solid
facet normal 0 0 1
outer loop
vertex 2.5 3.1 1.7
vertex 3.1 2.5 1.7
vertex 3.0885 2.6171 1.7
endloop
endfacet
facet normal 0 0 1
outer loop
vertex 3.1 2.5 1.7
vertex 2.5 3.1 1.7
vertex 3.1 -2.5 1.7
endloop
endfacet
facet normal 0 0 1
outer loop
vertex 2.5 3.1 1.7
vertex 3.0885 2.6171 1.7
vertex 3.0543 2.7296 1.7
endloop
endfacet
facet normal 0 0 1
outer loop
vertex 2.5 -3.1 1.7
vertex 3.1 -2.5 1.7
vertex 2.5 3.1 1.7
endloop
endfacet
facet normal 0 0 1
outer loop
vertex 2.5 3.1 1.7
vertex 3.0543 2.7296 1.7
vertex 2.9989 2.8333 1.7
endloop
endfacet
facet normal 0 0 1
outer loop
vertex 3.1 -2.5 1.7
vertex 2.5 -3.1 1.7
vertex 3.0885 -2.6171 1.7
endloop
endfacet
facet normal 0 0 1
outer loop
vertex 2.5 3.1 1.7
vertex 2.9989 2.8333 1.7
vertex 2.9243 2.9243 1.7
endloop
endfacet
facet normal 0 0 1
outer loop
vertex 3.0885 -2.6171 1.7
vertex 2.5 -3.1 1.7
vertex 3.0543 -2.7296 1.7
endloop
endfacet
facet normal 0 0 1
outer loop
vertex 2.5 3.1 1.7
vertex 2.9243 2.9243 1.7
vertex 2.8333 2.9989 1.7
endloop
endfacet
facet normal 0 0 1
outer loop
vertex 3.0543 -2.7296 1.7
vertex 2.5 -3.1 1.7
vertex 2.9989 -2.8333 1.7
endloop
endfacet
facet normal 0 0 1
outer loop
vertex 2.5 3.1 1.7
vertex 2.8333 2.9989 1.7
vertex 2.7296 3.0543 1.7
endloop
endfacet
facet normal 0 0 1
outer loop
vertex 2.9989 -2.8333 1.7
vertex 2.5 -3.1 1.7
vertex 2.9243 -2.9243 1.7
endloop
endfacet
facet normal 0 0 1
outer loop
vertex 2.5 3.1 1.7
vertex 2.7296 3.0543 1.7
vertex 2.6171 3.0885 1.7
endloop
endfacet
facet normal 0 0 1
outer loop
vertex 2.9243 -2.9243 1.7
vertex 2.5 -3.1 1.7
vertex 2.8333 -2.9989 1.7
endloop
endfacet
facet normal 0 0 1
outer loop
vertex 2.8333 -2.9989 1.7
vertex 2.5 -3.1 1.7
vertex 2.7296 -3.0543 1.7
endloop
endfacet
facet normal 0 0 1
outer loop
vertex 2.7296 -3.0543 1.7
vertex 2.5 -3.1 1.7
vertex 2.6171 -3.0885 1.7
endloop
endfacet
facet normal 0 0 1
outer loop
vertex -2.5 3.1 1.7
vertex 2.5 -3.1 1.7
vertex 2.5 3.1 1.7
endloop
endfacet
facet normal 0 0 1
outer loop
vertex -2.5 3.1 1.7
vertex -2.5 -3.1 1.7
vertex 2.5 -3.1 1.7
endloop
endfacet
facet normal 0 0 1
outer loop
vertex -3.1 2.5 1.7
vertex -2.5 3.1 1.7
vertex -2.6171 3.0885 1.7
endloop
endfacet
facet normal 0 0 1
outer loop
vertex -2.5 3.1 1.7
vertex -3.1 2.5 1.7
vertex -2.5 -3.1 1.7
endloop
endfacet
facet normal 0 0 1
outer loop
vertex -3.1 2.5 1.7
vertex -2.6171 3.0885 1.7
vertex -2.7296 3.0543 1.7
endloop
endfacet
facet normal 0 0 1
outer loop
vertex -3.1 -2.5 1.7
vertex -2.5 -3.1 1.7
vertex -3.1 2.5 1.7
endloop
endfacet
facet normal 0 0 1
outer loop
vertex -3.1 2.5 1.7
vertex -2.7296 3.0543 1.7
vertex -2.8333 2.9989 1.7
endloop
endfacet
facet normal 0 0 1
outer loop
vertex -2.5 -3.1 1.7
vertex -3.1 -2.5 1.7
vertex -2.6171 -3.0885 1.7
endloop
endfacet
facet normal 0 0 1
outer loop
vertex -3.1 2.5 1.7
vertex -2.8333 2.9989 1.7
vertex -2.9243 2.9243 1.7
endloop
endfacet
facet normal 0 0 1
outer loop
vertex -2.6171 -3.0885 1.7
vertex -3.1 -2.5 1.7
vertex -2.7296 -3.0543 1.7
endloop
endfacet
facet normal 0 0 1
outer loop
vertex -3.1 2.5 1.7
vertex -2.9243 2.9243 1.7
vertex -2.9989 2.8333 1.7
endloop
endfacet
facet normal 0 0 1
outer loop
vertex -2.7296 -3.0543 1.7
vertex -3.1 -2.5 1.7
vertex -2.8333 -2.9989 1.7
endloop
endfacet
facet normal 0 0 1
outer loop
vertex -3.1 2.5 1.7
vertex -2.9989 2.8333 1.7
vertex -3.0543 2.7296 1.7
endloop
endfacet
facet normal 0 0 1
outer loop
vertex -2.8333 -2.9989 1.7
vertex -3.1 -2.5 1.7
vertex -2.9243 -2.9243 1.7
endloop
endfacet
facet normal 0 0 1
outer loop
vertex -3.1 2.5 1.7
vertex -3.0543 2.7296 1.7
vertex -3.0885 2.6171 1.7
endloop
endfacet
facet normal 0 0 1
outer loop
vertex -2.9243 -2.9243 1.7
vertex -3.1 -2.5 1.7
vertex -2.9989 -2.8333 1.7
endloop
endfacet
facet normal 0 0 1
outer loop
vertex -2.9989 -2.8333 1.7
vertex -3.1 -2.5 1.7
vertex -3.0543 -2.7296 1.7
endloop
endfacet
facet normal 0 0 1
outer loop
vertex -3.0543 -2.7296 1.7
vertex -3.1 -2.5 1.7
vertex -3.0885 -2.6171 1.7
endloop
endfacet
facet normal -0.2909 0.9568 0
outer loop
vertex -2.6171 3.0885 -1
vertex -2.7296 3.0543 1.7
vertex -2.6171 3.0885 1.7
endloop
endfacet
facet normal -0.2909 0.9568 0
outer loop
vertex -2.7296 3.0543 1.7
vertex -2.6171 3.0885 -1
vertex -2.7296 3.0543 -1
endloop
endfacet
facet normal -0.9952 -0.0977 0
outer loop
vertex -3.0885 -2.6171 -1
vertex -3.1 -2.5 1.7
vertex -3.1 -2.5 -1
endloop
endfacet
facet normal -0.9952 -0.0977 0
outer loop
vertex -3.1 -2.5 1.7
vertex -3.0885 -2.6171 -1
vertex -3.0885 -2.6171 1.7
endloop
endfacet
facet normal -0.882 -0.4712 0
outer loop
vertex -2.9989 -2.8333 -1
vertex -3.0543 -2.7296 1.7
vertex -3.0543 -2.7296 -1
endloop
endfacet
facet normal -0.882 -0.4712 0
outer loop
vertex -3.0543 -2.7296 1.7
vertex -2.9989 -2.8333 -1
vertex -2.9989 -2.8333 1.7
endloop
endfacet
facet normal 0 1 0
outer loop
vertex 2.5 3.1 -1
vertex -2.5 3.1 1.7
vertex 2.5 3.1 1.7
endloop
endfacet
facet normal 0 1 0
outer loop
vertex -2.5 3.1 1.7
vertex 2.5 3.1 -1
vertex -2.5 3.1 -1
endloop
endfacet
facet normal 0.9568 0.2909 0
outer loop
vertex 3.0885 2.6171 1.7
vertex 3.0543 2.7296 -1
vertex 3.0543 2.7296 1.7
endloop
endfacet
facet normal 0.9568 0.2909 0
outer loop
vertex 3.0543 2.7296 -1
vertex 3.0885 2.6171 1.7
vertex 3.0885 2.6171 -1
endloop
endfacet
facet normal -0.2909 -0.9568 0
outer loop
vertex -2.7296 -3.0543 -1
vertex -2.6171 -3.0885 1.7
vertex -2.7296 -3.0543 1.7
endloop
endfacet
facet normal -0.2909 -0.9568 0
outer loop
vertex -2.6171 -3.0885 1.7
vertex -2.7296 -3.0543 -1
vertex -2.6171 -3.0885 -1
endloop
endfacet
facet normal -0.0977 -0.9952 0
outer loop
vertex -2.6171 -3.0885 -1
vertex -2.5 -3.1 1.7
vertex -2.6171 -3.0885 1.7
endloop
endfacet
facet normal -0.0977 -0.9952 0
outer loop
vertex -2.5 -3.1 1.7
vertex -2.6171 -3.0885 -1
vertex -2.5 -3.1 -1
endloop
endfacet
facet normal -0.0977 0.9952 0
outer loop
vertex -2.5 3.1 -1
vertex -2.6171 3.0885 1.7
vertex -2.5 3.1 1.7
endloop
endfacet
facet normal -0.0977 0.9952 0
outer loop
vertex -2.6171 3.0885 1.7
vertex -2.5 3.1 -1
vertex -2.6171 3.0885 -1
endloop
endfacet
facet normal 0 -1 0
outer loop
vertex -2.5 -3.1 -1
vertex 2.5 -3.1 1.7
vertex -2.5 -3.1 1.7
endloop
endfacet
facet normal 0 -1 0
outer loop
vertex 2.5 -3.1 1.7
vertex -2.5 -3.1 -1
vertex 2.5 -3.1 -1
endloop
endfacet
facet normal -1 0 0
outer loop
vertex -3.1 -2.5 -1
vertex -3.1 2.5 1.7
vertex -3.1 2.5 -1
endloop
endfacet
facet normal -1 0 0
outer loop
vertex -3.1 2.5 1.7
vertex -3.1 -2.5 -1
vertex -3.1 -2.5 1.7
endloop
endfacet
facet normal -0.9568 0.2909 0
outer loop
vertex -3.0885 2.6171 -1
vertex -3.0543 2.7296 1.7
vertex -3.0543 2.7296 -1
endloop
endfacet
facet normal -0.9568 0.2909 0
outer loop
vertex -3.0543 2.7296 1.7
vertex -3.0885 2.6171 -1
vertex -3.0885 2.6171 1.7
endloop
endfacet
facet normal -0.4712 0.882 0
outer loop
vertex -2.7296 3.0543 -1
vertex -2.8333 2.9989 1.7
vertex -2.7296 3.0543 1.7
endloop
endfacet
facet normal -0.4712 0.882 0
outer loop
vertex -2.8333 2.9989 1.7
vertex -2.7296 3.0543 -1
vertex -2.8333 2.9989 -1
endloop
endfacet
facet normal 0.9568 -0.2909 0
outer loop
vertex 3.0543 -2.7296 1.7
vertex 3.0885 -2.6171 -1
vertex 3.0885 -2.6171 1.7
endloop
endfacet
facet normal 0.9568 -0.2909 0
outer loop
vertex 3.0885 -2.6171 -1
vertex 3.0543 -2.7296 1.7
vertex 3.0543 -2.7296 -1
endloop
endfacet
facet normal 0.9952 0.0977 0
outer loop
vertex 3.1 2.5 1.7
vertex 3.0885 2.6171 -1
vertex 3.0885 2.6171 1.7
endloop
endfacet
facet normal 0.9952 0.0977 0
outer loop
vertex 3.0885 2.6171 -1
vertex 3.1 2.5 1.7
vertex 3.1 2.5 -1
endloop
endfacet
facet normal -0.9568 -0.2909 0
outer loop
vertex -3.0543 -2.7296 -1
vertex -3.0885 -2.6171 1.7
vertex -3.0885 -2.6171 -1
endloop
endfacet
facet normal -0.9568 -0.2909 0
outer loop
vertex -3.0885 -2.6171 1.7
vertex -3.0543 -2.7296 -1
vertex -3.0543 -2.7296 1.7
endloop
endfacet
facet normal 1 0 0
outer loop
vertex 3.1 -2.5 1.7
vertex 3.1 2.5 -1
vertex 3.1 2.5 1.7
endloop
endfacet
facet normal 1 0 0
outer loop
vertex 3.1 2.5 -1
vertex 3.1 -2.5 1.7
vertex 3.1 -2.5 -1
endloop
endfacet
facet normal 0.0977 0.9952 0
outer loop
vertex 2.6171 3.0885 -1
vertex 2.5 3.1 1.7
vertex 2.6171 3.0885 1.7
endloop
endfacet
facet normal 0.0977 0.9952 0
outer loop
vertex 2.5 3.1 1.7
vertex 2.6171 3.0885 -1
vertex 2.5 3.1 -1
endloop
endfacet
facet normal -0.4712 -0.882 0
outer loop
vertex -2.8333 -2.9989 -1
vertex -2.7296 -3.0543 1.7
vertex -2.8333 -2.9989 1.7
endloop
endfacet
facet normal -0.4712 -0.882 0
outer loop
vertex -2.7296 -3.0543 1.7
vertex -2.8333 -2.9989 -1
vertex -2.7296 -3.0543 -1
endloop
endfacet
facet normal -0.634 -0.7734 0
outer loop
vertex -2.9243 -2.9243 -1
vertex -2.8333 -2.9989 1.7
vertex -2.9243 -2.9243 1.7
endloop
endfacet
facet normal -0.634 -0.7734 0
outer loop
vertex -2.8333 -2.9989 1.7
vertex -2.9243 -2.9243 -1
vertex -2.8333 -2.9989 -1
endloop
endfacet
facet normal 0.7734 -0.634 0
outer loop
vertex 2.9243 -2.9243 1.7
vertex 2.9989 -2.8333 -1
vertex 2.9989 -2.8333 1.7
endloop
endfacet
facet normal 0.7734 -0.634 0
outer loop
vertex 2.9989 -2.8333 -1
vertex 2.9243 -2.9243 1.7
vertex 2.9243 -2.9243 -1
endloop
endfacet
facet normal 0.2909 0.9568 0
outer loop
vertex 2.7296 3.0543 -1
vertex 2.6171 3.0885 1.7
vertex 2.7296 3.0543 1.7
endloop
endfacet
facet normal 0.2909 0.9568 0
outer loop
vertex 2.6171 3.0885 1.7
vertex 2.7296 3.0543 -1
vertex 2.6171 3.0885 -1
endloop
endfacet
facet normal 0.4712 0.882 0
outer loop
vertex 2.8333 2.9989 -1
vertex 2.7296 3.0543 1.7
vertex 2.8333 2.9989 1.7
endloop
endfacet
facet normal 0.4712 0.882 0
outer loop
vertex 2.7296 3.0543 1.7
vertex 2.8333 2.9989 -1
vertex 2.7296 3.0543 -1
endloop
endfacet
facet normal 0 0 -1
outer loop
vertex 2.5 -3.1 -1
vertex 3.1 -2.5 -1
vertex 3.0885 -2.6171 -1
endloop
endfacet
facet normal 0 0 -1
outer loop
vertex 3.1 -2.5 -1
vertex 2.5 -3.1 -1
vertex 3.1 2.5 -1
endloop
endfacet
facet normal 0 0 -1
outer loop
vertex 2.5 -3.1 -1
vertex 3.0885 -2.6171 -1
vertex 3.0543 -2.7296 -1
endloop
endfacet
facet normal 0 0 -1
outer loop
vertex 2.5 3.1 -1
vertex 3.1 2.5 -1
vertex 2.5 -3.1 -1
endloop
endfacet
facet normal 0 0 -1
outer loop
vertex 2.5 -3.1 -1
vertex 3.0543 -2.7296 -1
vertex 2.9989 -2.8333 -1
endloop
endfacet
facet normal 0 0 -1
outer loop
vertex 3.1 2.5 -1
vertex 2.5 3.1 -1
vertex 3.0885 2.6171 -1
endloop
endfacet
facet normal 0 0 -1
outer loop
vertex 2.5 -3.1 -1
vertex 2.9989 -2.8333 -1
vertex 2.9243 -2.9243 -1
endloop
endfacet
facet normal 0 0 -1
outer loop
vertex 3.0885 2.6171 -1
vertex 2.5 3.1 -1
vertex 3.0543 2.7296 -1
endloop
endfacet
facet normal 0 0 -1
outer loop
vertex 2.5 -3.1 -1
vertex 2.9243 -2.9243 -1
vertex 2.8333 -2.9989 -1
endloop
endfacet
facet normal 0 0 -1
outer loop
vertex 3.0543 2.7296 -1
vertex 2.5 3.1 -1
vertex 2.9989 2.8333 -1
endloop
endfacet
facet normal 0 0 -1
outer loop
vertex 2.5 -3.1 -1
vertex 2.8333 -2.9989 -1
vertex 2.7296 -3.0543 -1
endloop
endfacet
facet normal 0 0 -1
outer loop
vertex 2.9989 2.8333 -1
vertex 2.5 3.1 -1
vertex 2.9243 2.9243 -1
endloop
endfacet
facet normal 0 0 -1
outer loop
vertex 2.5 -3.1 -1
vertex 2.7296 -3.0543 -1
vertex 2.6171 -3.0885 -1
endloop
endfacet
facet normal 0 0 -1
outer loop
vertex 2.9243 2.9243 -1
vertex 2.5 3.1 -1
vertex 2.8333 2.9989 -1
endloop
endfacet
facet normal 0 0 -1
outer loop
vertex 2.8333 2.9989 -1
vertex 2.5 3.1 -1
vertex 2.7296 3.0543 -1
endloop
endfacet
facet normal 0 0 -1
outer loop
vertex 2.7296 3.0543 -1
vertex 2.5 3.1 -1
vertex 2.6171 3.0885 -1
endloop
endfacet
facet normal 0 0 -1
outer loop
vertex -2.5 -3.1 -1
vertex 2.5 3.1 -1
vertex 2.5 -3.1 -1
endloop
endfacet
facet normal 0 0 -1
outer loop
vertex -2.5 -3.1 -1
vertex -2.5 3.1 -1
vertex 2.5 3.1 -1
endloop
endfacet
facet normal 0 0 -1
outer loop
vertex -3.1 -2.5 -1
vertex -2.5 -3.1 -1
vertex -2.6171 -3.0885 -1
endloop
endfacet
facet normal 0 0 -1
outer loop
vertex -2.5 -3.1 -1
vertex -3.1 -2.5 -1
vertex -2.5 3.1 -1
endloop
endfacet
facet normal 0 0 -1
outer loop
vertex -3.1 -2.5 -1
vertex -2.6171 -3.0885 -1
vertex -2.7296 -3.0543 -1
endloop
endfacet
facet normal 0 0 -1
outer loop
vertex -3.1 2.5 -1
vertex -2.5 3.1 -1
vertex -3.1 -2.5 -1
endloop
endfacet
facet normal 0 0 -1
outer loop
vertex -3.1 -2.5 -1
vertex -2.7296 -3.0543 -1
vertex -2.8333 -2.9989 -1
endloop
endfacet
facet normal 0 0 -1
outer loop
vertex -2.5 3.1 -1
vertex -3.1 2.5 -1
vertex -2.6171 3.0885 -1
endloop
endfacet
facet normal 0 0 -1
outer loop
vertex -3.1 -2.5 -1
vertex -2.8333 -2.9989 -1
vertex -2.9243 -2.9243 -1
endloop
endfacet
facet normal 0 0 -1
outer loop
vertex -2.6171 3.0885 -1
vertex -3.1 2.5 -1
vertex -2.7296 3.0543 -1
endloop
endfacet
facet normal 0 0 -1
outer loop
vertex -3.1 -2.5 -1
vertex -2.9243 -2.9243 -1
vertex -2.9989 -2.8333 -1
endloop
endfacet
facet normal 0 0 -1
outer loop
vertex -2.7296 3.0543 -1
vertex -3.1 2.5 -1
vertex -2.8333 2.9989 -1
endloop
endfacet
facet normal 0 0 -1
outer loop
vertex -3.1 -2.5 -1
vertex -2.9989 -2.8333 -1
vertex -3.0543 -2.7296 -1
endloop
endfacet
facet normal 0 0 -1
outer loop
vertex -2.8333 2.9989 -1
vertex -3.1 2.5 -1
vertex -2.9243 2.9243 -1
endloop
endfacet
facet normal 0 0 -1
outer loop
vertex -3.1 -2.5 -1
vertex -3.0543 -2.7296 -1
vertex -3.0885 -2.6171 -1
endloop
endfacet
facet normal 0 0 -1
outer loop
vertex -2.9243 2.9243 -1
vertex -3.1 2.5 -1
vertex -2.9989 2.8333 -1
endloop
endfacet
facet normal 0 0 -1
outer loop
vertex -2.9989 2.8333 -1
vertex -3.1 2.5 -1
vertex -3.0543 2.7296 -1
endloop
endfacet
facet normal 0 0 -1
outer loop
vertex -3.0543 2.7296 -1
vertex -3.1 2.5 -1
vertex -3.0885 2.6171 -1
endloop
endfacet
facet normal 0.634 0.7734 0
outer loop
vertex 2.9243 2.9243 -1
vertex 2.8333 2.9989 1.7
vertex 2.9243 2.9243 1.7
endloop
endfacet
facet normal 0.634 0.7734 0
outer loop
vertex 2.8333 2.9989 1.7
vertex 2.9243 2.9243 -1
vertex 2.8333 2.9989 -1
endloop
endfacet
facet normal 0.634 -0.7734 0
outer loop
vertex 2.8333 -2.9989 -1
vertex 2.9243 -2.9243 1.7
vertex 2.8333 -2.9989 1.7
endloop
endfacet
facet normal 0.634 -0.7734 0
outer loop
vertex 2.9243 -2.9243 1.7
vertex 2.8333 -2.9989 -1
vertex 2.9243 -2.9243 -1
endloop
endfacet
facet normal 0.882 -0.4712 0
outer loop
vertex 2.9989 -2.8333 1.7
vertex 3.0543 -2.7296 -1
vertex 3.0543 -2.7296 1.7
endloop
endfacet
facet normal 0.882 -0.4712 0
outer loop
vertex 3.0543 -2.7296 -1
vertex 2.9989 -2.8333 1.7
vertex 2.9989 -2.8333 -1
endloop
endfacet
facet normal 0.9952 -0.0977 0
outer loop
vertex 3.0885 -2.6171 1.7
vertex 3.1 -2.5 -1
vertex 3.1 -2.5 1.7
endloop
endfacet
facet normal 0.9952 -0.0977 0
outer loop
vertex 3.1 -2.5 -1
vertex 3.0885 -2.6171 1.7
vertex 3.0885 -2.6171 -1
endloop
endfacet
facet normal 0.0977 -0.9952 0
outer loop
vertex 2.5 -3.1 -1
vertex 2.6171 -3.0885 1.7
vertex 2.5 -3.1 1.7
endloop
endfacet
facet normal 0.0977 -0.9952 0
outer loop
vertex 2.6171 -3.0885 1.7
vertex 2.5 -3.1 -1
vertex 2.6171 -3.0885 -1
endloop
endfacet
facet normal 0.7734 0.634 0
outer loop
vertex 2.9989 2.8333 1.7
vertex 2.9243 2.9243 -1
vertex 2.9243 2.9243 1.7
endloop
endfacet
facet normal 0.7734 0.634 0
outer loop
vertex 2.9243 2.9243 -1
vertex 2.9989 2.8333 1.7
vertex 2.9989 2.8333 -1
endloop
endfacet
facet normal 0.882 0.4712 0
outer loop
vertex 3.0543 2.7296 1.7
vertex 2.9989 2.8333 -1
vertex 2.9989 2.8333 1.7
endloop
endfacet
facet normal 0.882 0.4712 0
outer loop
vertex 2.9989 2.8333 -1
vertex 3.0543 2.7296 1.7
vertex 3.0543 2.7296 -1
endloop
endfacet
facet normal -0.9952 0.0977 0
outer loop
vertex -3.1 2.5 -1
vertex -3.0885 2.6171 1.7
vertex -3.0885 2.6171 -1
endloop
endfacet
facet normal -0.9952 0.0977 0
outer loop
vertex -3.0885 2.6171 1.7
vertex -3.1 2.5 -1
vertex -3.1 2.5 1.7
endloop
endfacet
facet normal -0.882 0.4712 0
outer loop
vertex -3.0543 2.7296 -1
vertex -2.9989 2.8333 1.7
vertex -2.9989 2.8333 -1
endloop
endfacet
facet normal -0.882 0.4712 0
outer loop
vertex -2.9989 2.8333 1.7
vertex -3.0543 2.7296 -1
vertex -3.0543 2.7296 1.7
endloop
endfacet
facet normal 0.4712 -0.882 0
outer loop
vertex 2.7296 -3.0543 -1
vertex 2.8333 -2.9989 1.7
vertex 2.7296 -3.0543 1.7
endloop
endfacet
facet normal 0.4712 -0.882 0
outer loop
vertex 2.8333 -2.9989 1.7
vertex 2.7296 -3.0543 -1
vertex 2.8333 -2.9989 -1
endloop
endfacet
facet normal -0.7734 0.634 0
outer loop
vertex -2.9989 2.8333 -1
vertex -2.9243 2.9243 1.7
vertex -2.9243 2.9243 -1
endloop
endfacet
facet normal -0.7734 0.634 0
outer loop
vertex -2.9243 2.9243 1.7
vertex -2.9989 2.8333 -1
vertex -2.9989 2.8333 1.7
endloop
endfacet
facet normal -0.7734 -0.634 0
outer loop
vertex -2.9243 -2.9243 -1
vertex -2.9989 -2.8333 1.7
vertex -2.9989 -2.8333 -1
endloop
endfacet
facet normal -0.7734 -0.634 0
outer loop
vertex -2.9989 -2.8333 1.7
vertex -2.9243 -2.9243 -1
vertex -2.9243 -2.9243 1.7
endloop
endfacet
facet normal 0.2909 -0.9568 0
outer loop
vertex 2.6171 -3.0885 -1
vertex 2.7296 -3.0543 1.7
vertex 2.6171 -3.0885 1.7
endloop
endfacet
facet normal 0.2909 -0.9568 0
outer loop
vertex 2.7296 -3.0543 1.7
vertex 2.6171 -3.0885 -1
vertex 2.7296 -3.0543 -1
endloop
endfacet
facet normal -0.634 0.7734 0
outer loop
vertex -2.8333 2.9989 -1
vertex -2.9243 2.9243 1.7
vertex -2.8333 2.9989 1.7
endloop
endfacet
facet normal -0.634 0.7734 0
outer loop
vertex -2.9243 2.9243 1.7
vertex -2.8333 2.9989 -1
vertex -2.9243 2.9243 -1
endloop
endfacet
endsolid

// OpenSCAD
/**
 * Martin Egli
 * 2023-04-04
 */

module rotaryEVQ_V5B00215B(loc_res = 32) {
    difference() {
        union() {
            color("LightGray")
            translate([0, 0, 0])
            cylinder(d = 21.9, h = 15, $fn = loc_res);
            color("DarkGray") {
                translate([0, 0, 0])
                cylinder(d = 26.5, h = 6, $fn = loc_res);
                translate([-14/2, -28/2, 0])
                cube([14, 28, 6]);
                translate([-28/2, -2.5/2, 0])
                cube([28, 2.5, 6]);
            }
        }        
        translate([0, 0, -1])
        cylinder(d = 17.6, h = 15+2, $fn = loc_res);
    }
}
//rotaryEVQ_V5B00215B();

module oled1_28ZollRound(loc_res = 32) {
    color("White")
    translate([0, 0, 0.1])
    cylinder(d = 32.4, h = 1.5, $fn = loc_res);
    color("DarkGray")
    hull() {
        translate([0, 0, 0])
        cylinder(d = 35.6, h = 1.5, $fn = loc_res);
        translate([-14/2, -38.1/2, 0])
        cube([14, 10, 1.5]);
    }
}
//oled1_28ZollRound();

module buttonPTS526SK_SMTR2(loc_res = 32, h1 = 1.5) {
    // button
    color("Gold")
    translate([0, 0, 0])
    cylinder(d = 2, h = h1, $fn = loc_res);
    // leads
    color("Silver") {
        translate([-6.4/2, -3.7/2-0.5/2, 0])
        cube([6.4, 0.5, 0.1]);
        translate([-6.4/2, 3.7/2-0.5/2, 0])
        cube([6.4, 0.5, 0.1]);
    }
    // body
    color("Black")
    hull() {
        translate([-5.2/2, -2.6/2, 0])
        cube([5.2, 2.6, 0.9]);
        translate([-2.6/2, -5.2/2, 0])
        cube([2.6, 5.2, 0.9]);
    }
    color("Silver")
    hull() {
        translate([-5.2/2, -2.6/2, 0.9])
        cube([5.2, 2.6, 0.1]);
        translate([-2.6/2, -5.2/2, 0.9])
        cube([2.6, 5.2, 0.1]);
    }
    // middle part
    color("Silver")
    translate([0, 0, 1])
    cylinder(d1 = 4, d2 = 3.5, h = 0.15, $fn = loc_res);
}

module buttonPTS526SK15SMTR2(loc_res = 32) {
    buttonPTS526SK_SMTR2(loc_res, 1.5);
}

module led0505(loc_res = 32) {
    difference() {
        union() {
            color("White")
            translate([-5/2, -5/2, 0])
            cube([5, 5, 1.6]);
            color("Gray")
            translate([0, 0, 1.5])
            cylinder(d = 4, h = 0.2, $fn = loc_res);
        }
        translate([5/2, -5/2-1.5, 1.6-0.2])
        rotate([0, 0, 45])
        cube([2, 2, 0.3]);
    }
}

module ledWS2812B(loc_res = 32) {
    led0505(loc_res);
}

module ledSK6812(loc_res = 32) {
    led0505(loc_res);
}
ledSK6812();
module ledSK6812_cutout(loc_res = 32, cut_hi = 1.7+1) {
    hull() {
        translate([+5/2, +5/2, -1])
        cylinder(d = 1.2, h = cut_hi, $fn = loc_res);
        translate([+5/2, -5/2, -1])
        cylinder(d = 1.2, h = cut_hi, $fn = loc_res);
        translate([-5/2, +5/2, -1])
        cylinder(d = 1.2, h = cut_hi, $fn = loc_res);
        translate([-5/2, -5/2, -1])
        cylinder(d = 1.2, h = cut_hi, $fn = loc_res);
    }
}
ledSK6812_cutout();
